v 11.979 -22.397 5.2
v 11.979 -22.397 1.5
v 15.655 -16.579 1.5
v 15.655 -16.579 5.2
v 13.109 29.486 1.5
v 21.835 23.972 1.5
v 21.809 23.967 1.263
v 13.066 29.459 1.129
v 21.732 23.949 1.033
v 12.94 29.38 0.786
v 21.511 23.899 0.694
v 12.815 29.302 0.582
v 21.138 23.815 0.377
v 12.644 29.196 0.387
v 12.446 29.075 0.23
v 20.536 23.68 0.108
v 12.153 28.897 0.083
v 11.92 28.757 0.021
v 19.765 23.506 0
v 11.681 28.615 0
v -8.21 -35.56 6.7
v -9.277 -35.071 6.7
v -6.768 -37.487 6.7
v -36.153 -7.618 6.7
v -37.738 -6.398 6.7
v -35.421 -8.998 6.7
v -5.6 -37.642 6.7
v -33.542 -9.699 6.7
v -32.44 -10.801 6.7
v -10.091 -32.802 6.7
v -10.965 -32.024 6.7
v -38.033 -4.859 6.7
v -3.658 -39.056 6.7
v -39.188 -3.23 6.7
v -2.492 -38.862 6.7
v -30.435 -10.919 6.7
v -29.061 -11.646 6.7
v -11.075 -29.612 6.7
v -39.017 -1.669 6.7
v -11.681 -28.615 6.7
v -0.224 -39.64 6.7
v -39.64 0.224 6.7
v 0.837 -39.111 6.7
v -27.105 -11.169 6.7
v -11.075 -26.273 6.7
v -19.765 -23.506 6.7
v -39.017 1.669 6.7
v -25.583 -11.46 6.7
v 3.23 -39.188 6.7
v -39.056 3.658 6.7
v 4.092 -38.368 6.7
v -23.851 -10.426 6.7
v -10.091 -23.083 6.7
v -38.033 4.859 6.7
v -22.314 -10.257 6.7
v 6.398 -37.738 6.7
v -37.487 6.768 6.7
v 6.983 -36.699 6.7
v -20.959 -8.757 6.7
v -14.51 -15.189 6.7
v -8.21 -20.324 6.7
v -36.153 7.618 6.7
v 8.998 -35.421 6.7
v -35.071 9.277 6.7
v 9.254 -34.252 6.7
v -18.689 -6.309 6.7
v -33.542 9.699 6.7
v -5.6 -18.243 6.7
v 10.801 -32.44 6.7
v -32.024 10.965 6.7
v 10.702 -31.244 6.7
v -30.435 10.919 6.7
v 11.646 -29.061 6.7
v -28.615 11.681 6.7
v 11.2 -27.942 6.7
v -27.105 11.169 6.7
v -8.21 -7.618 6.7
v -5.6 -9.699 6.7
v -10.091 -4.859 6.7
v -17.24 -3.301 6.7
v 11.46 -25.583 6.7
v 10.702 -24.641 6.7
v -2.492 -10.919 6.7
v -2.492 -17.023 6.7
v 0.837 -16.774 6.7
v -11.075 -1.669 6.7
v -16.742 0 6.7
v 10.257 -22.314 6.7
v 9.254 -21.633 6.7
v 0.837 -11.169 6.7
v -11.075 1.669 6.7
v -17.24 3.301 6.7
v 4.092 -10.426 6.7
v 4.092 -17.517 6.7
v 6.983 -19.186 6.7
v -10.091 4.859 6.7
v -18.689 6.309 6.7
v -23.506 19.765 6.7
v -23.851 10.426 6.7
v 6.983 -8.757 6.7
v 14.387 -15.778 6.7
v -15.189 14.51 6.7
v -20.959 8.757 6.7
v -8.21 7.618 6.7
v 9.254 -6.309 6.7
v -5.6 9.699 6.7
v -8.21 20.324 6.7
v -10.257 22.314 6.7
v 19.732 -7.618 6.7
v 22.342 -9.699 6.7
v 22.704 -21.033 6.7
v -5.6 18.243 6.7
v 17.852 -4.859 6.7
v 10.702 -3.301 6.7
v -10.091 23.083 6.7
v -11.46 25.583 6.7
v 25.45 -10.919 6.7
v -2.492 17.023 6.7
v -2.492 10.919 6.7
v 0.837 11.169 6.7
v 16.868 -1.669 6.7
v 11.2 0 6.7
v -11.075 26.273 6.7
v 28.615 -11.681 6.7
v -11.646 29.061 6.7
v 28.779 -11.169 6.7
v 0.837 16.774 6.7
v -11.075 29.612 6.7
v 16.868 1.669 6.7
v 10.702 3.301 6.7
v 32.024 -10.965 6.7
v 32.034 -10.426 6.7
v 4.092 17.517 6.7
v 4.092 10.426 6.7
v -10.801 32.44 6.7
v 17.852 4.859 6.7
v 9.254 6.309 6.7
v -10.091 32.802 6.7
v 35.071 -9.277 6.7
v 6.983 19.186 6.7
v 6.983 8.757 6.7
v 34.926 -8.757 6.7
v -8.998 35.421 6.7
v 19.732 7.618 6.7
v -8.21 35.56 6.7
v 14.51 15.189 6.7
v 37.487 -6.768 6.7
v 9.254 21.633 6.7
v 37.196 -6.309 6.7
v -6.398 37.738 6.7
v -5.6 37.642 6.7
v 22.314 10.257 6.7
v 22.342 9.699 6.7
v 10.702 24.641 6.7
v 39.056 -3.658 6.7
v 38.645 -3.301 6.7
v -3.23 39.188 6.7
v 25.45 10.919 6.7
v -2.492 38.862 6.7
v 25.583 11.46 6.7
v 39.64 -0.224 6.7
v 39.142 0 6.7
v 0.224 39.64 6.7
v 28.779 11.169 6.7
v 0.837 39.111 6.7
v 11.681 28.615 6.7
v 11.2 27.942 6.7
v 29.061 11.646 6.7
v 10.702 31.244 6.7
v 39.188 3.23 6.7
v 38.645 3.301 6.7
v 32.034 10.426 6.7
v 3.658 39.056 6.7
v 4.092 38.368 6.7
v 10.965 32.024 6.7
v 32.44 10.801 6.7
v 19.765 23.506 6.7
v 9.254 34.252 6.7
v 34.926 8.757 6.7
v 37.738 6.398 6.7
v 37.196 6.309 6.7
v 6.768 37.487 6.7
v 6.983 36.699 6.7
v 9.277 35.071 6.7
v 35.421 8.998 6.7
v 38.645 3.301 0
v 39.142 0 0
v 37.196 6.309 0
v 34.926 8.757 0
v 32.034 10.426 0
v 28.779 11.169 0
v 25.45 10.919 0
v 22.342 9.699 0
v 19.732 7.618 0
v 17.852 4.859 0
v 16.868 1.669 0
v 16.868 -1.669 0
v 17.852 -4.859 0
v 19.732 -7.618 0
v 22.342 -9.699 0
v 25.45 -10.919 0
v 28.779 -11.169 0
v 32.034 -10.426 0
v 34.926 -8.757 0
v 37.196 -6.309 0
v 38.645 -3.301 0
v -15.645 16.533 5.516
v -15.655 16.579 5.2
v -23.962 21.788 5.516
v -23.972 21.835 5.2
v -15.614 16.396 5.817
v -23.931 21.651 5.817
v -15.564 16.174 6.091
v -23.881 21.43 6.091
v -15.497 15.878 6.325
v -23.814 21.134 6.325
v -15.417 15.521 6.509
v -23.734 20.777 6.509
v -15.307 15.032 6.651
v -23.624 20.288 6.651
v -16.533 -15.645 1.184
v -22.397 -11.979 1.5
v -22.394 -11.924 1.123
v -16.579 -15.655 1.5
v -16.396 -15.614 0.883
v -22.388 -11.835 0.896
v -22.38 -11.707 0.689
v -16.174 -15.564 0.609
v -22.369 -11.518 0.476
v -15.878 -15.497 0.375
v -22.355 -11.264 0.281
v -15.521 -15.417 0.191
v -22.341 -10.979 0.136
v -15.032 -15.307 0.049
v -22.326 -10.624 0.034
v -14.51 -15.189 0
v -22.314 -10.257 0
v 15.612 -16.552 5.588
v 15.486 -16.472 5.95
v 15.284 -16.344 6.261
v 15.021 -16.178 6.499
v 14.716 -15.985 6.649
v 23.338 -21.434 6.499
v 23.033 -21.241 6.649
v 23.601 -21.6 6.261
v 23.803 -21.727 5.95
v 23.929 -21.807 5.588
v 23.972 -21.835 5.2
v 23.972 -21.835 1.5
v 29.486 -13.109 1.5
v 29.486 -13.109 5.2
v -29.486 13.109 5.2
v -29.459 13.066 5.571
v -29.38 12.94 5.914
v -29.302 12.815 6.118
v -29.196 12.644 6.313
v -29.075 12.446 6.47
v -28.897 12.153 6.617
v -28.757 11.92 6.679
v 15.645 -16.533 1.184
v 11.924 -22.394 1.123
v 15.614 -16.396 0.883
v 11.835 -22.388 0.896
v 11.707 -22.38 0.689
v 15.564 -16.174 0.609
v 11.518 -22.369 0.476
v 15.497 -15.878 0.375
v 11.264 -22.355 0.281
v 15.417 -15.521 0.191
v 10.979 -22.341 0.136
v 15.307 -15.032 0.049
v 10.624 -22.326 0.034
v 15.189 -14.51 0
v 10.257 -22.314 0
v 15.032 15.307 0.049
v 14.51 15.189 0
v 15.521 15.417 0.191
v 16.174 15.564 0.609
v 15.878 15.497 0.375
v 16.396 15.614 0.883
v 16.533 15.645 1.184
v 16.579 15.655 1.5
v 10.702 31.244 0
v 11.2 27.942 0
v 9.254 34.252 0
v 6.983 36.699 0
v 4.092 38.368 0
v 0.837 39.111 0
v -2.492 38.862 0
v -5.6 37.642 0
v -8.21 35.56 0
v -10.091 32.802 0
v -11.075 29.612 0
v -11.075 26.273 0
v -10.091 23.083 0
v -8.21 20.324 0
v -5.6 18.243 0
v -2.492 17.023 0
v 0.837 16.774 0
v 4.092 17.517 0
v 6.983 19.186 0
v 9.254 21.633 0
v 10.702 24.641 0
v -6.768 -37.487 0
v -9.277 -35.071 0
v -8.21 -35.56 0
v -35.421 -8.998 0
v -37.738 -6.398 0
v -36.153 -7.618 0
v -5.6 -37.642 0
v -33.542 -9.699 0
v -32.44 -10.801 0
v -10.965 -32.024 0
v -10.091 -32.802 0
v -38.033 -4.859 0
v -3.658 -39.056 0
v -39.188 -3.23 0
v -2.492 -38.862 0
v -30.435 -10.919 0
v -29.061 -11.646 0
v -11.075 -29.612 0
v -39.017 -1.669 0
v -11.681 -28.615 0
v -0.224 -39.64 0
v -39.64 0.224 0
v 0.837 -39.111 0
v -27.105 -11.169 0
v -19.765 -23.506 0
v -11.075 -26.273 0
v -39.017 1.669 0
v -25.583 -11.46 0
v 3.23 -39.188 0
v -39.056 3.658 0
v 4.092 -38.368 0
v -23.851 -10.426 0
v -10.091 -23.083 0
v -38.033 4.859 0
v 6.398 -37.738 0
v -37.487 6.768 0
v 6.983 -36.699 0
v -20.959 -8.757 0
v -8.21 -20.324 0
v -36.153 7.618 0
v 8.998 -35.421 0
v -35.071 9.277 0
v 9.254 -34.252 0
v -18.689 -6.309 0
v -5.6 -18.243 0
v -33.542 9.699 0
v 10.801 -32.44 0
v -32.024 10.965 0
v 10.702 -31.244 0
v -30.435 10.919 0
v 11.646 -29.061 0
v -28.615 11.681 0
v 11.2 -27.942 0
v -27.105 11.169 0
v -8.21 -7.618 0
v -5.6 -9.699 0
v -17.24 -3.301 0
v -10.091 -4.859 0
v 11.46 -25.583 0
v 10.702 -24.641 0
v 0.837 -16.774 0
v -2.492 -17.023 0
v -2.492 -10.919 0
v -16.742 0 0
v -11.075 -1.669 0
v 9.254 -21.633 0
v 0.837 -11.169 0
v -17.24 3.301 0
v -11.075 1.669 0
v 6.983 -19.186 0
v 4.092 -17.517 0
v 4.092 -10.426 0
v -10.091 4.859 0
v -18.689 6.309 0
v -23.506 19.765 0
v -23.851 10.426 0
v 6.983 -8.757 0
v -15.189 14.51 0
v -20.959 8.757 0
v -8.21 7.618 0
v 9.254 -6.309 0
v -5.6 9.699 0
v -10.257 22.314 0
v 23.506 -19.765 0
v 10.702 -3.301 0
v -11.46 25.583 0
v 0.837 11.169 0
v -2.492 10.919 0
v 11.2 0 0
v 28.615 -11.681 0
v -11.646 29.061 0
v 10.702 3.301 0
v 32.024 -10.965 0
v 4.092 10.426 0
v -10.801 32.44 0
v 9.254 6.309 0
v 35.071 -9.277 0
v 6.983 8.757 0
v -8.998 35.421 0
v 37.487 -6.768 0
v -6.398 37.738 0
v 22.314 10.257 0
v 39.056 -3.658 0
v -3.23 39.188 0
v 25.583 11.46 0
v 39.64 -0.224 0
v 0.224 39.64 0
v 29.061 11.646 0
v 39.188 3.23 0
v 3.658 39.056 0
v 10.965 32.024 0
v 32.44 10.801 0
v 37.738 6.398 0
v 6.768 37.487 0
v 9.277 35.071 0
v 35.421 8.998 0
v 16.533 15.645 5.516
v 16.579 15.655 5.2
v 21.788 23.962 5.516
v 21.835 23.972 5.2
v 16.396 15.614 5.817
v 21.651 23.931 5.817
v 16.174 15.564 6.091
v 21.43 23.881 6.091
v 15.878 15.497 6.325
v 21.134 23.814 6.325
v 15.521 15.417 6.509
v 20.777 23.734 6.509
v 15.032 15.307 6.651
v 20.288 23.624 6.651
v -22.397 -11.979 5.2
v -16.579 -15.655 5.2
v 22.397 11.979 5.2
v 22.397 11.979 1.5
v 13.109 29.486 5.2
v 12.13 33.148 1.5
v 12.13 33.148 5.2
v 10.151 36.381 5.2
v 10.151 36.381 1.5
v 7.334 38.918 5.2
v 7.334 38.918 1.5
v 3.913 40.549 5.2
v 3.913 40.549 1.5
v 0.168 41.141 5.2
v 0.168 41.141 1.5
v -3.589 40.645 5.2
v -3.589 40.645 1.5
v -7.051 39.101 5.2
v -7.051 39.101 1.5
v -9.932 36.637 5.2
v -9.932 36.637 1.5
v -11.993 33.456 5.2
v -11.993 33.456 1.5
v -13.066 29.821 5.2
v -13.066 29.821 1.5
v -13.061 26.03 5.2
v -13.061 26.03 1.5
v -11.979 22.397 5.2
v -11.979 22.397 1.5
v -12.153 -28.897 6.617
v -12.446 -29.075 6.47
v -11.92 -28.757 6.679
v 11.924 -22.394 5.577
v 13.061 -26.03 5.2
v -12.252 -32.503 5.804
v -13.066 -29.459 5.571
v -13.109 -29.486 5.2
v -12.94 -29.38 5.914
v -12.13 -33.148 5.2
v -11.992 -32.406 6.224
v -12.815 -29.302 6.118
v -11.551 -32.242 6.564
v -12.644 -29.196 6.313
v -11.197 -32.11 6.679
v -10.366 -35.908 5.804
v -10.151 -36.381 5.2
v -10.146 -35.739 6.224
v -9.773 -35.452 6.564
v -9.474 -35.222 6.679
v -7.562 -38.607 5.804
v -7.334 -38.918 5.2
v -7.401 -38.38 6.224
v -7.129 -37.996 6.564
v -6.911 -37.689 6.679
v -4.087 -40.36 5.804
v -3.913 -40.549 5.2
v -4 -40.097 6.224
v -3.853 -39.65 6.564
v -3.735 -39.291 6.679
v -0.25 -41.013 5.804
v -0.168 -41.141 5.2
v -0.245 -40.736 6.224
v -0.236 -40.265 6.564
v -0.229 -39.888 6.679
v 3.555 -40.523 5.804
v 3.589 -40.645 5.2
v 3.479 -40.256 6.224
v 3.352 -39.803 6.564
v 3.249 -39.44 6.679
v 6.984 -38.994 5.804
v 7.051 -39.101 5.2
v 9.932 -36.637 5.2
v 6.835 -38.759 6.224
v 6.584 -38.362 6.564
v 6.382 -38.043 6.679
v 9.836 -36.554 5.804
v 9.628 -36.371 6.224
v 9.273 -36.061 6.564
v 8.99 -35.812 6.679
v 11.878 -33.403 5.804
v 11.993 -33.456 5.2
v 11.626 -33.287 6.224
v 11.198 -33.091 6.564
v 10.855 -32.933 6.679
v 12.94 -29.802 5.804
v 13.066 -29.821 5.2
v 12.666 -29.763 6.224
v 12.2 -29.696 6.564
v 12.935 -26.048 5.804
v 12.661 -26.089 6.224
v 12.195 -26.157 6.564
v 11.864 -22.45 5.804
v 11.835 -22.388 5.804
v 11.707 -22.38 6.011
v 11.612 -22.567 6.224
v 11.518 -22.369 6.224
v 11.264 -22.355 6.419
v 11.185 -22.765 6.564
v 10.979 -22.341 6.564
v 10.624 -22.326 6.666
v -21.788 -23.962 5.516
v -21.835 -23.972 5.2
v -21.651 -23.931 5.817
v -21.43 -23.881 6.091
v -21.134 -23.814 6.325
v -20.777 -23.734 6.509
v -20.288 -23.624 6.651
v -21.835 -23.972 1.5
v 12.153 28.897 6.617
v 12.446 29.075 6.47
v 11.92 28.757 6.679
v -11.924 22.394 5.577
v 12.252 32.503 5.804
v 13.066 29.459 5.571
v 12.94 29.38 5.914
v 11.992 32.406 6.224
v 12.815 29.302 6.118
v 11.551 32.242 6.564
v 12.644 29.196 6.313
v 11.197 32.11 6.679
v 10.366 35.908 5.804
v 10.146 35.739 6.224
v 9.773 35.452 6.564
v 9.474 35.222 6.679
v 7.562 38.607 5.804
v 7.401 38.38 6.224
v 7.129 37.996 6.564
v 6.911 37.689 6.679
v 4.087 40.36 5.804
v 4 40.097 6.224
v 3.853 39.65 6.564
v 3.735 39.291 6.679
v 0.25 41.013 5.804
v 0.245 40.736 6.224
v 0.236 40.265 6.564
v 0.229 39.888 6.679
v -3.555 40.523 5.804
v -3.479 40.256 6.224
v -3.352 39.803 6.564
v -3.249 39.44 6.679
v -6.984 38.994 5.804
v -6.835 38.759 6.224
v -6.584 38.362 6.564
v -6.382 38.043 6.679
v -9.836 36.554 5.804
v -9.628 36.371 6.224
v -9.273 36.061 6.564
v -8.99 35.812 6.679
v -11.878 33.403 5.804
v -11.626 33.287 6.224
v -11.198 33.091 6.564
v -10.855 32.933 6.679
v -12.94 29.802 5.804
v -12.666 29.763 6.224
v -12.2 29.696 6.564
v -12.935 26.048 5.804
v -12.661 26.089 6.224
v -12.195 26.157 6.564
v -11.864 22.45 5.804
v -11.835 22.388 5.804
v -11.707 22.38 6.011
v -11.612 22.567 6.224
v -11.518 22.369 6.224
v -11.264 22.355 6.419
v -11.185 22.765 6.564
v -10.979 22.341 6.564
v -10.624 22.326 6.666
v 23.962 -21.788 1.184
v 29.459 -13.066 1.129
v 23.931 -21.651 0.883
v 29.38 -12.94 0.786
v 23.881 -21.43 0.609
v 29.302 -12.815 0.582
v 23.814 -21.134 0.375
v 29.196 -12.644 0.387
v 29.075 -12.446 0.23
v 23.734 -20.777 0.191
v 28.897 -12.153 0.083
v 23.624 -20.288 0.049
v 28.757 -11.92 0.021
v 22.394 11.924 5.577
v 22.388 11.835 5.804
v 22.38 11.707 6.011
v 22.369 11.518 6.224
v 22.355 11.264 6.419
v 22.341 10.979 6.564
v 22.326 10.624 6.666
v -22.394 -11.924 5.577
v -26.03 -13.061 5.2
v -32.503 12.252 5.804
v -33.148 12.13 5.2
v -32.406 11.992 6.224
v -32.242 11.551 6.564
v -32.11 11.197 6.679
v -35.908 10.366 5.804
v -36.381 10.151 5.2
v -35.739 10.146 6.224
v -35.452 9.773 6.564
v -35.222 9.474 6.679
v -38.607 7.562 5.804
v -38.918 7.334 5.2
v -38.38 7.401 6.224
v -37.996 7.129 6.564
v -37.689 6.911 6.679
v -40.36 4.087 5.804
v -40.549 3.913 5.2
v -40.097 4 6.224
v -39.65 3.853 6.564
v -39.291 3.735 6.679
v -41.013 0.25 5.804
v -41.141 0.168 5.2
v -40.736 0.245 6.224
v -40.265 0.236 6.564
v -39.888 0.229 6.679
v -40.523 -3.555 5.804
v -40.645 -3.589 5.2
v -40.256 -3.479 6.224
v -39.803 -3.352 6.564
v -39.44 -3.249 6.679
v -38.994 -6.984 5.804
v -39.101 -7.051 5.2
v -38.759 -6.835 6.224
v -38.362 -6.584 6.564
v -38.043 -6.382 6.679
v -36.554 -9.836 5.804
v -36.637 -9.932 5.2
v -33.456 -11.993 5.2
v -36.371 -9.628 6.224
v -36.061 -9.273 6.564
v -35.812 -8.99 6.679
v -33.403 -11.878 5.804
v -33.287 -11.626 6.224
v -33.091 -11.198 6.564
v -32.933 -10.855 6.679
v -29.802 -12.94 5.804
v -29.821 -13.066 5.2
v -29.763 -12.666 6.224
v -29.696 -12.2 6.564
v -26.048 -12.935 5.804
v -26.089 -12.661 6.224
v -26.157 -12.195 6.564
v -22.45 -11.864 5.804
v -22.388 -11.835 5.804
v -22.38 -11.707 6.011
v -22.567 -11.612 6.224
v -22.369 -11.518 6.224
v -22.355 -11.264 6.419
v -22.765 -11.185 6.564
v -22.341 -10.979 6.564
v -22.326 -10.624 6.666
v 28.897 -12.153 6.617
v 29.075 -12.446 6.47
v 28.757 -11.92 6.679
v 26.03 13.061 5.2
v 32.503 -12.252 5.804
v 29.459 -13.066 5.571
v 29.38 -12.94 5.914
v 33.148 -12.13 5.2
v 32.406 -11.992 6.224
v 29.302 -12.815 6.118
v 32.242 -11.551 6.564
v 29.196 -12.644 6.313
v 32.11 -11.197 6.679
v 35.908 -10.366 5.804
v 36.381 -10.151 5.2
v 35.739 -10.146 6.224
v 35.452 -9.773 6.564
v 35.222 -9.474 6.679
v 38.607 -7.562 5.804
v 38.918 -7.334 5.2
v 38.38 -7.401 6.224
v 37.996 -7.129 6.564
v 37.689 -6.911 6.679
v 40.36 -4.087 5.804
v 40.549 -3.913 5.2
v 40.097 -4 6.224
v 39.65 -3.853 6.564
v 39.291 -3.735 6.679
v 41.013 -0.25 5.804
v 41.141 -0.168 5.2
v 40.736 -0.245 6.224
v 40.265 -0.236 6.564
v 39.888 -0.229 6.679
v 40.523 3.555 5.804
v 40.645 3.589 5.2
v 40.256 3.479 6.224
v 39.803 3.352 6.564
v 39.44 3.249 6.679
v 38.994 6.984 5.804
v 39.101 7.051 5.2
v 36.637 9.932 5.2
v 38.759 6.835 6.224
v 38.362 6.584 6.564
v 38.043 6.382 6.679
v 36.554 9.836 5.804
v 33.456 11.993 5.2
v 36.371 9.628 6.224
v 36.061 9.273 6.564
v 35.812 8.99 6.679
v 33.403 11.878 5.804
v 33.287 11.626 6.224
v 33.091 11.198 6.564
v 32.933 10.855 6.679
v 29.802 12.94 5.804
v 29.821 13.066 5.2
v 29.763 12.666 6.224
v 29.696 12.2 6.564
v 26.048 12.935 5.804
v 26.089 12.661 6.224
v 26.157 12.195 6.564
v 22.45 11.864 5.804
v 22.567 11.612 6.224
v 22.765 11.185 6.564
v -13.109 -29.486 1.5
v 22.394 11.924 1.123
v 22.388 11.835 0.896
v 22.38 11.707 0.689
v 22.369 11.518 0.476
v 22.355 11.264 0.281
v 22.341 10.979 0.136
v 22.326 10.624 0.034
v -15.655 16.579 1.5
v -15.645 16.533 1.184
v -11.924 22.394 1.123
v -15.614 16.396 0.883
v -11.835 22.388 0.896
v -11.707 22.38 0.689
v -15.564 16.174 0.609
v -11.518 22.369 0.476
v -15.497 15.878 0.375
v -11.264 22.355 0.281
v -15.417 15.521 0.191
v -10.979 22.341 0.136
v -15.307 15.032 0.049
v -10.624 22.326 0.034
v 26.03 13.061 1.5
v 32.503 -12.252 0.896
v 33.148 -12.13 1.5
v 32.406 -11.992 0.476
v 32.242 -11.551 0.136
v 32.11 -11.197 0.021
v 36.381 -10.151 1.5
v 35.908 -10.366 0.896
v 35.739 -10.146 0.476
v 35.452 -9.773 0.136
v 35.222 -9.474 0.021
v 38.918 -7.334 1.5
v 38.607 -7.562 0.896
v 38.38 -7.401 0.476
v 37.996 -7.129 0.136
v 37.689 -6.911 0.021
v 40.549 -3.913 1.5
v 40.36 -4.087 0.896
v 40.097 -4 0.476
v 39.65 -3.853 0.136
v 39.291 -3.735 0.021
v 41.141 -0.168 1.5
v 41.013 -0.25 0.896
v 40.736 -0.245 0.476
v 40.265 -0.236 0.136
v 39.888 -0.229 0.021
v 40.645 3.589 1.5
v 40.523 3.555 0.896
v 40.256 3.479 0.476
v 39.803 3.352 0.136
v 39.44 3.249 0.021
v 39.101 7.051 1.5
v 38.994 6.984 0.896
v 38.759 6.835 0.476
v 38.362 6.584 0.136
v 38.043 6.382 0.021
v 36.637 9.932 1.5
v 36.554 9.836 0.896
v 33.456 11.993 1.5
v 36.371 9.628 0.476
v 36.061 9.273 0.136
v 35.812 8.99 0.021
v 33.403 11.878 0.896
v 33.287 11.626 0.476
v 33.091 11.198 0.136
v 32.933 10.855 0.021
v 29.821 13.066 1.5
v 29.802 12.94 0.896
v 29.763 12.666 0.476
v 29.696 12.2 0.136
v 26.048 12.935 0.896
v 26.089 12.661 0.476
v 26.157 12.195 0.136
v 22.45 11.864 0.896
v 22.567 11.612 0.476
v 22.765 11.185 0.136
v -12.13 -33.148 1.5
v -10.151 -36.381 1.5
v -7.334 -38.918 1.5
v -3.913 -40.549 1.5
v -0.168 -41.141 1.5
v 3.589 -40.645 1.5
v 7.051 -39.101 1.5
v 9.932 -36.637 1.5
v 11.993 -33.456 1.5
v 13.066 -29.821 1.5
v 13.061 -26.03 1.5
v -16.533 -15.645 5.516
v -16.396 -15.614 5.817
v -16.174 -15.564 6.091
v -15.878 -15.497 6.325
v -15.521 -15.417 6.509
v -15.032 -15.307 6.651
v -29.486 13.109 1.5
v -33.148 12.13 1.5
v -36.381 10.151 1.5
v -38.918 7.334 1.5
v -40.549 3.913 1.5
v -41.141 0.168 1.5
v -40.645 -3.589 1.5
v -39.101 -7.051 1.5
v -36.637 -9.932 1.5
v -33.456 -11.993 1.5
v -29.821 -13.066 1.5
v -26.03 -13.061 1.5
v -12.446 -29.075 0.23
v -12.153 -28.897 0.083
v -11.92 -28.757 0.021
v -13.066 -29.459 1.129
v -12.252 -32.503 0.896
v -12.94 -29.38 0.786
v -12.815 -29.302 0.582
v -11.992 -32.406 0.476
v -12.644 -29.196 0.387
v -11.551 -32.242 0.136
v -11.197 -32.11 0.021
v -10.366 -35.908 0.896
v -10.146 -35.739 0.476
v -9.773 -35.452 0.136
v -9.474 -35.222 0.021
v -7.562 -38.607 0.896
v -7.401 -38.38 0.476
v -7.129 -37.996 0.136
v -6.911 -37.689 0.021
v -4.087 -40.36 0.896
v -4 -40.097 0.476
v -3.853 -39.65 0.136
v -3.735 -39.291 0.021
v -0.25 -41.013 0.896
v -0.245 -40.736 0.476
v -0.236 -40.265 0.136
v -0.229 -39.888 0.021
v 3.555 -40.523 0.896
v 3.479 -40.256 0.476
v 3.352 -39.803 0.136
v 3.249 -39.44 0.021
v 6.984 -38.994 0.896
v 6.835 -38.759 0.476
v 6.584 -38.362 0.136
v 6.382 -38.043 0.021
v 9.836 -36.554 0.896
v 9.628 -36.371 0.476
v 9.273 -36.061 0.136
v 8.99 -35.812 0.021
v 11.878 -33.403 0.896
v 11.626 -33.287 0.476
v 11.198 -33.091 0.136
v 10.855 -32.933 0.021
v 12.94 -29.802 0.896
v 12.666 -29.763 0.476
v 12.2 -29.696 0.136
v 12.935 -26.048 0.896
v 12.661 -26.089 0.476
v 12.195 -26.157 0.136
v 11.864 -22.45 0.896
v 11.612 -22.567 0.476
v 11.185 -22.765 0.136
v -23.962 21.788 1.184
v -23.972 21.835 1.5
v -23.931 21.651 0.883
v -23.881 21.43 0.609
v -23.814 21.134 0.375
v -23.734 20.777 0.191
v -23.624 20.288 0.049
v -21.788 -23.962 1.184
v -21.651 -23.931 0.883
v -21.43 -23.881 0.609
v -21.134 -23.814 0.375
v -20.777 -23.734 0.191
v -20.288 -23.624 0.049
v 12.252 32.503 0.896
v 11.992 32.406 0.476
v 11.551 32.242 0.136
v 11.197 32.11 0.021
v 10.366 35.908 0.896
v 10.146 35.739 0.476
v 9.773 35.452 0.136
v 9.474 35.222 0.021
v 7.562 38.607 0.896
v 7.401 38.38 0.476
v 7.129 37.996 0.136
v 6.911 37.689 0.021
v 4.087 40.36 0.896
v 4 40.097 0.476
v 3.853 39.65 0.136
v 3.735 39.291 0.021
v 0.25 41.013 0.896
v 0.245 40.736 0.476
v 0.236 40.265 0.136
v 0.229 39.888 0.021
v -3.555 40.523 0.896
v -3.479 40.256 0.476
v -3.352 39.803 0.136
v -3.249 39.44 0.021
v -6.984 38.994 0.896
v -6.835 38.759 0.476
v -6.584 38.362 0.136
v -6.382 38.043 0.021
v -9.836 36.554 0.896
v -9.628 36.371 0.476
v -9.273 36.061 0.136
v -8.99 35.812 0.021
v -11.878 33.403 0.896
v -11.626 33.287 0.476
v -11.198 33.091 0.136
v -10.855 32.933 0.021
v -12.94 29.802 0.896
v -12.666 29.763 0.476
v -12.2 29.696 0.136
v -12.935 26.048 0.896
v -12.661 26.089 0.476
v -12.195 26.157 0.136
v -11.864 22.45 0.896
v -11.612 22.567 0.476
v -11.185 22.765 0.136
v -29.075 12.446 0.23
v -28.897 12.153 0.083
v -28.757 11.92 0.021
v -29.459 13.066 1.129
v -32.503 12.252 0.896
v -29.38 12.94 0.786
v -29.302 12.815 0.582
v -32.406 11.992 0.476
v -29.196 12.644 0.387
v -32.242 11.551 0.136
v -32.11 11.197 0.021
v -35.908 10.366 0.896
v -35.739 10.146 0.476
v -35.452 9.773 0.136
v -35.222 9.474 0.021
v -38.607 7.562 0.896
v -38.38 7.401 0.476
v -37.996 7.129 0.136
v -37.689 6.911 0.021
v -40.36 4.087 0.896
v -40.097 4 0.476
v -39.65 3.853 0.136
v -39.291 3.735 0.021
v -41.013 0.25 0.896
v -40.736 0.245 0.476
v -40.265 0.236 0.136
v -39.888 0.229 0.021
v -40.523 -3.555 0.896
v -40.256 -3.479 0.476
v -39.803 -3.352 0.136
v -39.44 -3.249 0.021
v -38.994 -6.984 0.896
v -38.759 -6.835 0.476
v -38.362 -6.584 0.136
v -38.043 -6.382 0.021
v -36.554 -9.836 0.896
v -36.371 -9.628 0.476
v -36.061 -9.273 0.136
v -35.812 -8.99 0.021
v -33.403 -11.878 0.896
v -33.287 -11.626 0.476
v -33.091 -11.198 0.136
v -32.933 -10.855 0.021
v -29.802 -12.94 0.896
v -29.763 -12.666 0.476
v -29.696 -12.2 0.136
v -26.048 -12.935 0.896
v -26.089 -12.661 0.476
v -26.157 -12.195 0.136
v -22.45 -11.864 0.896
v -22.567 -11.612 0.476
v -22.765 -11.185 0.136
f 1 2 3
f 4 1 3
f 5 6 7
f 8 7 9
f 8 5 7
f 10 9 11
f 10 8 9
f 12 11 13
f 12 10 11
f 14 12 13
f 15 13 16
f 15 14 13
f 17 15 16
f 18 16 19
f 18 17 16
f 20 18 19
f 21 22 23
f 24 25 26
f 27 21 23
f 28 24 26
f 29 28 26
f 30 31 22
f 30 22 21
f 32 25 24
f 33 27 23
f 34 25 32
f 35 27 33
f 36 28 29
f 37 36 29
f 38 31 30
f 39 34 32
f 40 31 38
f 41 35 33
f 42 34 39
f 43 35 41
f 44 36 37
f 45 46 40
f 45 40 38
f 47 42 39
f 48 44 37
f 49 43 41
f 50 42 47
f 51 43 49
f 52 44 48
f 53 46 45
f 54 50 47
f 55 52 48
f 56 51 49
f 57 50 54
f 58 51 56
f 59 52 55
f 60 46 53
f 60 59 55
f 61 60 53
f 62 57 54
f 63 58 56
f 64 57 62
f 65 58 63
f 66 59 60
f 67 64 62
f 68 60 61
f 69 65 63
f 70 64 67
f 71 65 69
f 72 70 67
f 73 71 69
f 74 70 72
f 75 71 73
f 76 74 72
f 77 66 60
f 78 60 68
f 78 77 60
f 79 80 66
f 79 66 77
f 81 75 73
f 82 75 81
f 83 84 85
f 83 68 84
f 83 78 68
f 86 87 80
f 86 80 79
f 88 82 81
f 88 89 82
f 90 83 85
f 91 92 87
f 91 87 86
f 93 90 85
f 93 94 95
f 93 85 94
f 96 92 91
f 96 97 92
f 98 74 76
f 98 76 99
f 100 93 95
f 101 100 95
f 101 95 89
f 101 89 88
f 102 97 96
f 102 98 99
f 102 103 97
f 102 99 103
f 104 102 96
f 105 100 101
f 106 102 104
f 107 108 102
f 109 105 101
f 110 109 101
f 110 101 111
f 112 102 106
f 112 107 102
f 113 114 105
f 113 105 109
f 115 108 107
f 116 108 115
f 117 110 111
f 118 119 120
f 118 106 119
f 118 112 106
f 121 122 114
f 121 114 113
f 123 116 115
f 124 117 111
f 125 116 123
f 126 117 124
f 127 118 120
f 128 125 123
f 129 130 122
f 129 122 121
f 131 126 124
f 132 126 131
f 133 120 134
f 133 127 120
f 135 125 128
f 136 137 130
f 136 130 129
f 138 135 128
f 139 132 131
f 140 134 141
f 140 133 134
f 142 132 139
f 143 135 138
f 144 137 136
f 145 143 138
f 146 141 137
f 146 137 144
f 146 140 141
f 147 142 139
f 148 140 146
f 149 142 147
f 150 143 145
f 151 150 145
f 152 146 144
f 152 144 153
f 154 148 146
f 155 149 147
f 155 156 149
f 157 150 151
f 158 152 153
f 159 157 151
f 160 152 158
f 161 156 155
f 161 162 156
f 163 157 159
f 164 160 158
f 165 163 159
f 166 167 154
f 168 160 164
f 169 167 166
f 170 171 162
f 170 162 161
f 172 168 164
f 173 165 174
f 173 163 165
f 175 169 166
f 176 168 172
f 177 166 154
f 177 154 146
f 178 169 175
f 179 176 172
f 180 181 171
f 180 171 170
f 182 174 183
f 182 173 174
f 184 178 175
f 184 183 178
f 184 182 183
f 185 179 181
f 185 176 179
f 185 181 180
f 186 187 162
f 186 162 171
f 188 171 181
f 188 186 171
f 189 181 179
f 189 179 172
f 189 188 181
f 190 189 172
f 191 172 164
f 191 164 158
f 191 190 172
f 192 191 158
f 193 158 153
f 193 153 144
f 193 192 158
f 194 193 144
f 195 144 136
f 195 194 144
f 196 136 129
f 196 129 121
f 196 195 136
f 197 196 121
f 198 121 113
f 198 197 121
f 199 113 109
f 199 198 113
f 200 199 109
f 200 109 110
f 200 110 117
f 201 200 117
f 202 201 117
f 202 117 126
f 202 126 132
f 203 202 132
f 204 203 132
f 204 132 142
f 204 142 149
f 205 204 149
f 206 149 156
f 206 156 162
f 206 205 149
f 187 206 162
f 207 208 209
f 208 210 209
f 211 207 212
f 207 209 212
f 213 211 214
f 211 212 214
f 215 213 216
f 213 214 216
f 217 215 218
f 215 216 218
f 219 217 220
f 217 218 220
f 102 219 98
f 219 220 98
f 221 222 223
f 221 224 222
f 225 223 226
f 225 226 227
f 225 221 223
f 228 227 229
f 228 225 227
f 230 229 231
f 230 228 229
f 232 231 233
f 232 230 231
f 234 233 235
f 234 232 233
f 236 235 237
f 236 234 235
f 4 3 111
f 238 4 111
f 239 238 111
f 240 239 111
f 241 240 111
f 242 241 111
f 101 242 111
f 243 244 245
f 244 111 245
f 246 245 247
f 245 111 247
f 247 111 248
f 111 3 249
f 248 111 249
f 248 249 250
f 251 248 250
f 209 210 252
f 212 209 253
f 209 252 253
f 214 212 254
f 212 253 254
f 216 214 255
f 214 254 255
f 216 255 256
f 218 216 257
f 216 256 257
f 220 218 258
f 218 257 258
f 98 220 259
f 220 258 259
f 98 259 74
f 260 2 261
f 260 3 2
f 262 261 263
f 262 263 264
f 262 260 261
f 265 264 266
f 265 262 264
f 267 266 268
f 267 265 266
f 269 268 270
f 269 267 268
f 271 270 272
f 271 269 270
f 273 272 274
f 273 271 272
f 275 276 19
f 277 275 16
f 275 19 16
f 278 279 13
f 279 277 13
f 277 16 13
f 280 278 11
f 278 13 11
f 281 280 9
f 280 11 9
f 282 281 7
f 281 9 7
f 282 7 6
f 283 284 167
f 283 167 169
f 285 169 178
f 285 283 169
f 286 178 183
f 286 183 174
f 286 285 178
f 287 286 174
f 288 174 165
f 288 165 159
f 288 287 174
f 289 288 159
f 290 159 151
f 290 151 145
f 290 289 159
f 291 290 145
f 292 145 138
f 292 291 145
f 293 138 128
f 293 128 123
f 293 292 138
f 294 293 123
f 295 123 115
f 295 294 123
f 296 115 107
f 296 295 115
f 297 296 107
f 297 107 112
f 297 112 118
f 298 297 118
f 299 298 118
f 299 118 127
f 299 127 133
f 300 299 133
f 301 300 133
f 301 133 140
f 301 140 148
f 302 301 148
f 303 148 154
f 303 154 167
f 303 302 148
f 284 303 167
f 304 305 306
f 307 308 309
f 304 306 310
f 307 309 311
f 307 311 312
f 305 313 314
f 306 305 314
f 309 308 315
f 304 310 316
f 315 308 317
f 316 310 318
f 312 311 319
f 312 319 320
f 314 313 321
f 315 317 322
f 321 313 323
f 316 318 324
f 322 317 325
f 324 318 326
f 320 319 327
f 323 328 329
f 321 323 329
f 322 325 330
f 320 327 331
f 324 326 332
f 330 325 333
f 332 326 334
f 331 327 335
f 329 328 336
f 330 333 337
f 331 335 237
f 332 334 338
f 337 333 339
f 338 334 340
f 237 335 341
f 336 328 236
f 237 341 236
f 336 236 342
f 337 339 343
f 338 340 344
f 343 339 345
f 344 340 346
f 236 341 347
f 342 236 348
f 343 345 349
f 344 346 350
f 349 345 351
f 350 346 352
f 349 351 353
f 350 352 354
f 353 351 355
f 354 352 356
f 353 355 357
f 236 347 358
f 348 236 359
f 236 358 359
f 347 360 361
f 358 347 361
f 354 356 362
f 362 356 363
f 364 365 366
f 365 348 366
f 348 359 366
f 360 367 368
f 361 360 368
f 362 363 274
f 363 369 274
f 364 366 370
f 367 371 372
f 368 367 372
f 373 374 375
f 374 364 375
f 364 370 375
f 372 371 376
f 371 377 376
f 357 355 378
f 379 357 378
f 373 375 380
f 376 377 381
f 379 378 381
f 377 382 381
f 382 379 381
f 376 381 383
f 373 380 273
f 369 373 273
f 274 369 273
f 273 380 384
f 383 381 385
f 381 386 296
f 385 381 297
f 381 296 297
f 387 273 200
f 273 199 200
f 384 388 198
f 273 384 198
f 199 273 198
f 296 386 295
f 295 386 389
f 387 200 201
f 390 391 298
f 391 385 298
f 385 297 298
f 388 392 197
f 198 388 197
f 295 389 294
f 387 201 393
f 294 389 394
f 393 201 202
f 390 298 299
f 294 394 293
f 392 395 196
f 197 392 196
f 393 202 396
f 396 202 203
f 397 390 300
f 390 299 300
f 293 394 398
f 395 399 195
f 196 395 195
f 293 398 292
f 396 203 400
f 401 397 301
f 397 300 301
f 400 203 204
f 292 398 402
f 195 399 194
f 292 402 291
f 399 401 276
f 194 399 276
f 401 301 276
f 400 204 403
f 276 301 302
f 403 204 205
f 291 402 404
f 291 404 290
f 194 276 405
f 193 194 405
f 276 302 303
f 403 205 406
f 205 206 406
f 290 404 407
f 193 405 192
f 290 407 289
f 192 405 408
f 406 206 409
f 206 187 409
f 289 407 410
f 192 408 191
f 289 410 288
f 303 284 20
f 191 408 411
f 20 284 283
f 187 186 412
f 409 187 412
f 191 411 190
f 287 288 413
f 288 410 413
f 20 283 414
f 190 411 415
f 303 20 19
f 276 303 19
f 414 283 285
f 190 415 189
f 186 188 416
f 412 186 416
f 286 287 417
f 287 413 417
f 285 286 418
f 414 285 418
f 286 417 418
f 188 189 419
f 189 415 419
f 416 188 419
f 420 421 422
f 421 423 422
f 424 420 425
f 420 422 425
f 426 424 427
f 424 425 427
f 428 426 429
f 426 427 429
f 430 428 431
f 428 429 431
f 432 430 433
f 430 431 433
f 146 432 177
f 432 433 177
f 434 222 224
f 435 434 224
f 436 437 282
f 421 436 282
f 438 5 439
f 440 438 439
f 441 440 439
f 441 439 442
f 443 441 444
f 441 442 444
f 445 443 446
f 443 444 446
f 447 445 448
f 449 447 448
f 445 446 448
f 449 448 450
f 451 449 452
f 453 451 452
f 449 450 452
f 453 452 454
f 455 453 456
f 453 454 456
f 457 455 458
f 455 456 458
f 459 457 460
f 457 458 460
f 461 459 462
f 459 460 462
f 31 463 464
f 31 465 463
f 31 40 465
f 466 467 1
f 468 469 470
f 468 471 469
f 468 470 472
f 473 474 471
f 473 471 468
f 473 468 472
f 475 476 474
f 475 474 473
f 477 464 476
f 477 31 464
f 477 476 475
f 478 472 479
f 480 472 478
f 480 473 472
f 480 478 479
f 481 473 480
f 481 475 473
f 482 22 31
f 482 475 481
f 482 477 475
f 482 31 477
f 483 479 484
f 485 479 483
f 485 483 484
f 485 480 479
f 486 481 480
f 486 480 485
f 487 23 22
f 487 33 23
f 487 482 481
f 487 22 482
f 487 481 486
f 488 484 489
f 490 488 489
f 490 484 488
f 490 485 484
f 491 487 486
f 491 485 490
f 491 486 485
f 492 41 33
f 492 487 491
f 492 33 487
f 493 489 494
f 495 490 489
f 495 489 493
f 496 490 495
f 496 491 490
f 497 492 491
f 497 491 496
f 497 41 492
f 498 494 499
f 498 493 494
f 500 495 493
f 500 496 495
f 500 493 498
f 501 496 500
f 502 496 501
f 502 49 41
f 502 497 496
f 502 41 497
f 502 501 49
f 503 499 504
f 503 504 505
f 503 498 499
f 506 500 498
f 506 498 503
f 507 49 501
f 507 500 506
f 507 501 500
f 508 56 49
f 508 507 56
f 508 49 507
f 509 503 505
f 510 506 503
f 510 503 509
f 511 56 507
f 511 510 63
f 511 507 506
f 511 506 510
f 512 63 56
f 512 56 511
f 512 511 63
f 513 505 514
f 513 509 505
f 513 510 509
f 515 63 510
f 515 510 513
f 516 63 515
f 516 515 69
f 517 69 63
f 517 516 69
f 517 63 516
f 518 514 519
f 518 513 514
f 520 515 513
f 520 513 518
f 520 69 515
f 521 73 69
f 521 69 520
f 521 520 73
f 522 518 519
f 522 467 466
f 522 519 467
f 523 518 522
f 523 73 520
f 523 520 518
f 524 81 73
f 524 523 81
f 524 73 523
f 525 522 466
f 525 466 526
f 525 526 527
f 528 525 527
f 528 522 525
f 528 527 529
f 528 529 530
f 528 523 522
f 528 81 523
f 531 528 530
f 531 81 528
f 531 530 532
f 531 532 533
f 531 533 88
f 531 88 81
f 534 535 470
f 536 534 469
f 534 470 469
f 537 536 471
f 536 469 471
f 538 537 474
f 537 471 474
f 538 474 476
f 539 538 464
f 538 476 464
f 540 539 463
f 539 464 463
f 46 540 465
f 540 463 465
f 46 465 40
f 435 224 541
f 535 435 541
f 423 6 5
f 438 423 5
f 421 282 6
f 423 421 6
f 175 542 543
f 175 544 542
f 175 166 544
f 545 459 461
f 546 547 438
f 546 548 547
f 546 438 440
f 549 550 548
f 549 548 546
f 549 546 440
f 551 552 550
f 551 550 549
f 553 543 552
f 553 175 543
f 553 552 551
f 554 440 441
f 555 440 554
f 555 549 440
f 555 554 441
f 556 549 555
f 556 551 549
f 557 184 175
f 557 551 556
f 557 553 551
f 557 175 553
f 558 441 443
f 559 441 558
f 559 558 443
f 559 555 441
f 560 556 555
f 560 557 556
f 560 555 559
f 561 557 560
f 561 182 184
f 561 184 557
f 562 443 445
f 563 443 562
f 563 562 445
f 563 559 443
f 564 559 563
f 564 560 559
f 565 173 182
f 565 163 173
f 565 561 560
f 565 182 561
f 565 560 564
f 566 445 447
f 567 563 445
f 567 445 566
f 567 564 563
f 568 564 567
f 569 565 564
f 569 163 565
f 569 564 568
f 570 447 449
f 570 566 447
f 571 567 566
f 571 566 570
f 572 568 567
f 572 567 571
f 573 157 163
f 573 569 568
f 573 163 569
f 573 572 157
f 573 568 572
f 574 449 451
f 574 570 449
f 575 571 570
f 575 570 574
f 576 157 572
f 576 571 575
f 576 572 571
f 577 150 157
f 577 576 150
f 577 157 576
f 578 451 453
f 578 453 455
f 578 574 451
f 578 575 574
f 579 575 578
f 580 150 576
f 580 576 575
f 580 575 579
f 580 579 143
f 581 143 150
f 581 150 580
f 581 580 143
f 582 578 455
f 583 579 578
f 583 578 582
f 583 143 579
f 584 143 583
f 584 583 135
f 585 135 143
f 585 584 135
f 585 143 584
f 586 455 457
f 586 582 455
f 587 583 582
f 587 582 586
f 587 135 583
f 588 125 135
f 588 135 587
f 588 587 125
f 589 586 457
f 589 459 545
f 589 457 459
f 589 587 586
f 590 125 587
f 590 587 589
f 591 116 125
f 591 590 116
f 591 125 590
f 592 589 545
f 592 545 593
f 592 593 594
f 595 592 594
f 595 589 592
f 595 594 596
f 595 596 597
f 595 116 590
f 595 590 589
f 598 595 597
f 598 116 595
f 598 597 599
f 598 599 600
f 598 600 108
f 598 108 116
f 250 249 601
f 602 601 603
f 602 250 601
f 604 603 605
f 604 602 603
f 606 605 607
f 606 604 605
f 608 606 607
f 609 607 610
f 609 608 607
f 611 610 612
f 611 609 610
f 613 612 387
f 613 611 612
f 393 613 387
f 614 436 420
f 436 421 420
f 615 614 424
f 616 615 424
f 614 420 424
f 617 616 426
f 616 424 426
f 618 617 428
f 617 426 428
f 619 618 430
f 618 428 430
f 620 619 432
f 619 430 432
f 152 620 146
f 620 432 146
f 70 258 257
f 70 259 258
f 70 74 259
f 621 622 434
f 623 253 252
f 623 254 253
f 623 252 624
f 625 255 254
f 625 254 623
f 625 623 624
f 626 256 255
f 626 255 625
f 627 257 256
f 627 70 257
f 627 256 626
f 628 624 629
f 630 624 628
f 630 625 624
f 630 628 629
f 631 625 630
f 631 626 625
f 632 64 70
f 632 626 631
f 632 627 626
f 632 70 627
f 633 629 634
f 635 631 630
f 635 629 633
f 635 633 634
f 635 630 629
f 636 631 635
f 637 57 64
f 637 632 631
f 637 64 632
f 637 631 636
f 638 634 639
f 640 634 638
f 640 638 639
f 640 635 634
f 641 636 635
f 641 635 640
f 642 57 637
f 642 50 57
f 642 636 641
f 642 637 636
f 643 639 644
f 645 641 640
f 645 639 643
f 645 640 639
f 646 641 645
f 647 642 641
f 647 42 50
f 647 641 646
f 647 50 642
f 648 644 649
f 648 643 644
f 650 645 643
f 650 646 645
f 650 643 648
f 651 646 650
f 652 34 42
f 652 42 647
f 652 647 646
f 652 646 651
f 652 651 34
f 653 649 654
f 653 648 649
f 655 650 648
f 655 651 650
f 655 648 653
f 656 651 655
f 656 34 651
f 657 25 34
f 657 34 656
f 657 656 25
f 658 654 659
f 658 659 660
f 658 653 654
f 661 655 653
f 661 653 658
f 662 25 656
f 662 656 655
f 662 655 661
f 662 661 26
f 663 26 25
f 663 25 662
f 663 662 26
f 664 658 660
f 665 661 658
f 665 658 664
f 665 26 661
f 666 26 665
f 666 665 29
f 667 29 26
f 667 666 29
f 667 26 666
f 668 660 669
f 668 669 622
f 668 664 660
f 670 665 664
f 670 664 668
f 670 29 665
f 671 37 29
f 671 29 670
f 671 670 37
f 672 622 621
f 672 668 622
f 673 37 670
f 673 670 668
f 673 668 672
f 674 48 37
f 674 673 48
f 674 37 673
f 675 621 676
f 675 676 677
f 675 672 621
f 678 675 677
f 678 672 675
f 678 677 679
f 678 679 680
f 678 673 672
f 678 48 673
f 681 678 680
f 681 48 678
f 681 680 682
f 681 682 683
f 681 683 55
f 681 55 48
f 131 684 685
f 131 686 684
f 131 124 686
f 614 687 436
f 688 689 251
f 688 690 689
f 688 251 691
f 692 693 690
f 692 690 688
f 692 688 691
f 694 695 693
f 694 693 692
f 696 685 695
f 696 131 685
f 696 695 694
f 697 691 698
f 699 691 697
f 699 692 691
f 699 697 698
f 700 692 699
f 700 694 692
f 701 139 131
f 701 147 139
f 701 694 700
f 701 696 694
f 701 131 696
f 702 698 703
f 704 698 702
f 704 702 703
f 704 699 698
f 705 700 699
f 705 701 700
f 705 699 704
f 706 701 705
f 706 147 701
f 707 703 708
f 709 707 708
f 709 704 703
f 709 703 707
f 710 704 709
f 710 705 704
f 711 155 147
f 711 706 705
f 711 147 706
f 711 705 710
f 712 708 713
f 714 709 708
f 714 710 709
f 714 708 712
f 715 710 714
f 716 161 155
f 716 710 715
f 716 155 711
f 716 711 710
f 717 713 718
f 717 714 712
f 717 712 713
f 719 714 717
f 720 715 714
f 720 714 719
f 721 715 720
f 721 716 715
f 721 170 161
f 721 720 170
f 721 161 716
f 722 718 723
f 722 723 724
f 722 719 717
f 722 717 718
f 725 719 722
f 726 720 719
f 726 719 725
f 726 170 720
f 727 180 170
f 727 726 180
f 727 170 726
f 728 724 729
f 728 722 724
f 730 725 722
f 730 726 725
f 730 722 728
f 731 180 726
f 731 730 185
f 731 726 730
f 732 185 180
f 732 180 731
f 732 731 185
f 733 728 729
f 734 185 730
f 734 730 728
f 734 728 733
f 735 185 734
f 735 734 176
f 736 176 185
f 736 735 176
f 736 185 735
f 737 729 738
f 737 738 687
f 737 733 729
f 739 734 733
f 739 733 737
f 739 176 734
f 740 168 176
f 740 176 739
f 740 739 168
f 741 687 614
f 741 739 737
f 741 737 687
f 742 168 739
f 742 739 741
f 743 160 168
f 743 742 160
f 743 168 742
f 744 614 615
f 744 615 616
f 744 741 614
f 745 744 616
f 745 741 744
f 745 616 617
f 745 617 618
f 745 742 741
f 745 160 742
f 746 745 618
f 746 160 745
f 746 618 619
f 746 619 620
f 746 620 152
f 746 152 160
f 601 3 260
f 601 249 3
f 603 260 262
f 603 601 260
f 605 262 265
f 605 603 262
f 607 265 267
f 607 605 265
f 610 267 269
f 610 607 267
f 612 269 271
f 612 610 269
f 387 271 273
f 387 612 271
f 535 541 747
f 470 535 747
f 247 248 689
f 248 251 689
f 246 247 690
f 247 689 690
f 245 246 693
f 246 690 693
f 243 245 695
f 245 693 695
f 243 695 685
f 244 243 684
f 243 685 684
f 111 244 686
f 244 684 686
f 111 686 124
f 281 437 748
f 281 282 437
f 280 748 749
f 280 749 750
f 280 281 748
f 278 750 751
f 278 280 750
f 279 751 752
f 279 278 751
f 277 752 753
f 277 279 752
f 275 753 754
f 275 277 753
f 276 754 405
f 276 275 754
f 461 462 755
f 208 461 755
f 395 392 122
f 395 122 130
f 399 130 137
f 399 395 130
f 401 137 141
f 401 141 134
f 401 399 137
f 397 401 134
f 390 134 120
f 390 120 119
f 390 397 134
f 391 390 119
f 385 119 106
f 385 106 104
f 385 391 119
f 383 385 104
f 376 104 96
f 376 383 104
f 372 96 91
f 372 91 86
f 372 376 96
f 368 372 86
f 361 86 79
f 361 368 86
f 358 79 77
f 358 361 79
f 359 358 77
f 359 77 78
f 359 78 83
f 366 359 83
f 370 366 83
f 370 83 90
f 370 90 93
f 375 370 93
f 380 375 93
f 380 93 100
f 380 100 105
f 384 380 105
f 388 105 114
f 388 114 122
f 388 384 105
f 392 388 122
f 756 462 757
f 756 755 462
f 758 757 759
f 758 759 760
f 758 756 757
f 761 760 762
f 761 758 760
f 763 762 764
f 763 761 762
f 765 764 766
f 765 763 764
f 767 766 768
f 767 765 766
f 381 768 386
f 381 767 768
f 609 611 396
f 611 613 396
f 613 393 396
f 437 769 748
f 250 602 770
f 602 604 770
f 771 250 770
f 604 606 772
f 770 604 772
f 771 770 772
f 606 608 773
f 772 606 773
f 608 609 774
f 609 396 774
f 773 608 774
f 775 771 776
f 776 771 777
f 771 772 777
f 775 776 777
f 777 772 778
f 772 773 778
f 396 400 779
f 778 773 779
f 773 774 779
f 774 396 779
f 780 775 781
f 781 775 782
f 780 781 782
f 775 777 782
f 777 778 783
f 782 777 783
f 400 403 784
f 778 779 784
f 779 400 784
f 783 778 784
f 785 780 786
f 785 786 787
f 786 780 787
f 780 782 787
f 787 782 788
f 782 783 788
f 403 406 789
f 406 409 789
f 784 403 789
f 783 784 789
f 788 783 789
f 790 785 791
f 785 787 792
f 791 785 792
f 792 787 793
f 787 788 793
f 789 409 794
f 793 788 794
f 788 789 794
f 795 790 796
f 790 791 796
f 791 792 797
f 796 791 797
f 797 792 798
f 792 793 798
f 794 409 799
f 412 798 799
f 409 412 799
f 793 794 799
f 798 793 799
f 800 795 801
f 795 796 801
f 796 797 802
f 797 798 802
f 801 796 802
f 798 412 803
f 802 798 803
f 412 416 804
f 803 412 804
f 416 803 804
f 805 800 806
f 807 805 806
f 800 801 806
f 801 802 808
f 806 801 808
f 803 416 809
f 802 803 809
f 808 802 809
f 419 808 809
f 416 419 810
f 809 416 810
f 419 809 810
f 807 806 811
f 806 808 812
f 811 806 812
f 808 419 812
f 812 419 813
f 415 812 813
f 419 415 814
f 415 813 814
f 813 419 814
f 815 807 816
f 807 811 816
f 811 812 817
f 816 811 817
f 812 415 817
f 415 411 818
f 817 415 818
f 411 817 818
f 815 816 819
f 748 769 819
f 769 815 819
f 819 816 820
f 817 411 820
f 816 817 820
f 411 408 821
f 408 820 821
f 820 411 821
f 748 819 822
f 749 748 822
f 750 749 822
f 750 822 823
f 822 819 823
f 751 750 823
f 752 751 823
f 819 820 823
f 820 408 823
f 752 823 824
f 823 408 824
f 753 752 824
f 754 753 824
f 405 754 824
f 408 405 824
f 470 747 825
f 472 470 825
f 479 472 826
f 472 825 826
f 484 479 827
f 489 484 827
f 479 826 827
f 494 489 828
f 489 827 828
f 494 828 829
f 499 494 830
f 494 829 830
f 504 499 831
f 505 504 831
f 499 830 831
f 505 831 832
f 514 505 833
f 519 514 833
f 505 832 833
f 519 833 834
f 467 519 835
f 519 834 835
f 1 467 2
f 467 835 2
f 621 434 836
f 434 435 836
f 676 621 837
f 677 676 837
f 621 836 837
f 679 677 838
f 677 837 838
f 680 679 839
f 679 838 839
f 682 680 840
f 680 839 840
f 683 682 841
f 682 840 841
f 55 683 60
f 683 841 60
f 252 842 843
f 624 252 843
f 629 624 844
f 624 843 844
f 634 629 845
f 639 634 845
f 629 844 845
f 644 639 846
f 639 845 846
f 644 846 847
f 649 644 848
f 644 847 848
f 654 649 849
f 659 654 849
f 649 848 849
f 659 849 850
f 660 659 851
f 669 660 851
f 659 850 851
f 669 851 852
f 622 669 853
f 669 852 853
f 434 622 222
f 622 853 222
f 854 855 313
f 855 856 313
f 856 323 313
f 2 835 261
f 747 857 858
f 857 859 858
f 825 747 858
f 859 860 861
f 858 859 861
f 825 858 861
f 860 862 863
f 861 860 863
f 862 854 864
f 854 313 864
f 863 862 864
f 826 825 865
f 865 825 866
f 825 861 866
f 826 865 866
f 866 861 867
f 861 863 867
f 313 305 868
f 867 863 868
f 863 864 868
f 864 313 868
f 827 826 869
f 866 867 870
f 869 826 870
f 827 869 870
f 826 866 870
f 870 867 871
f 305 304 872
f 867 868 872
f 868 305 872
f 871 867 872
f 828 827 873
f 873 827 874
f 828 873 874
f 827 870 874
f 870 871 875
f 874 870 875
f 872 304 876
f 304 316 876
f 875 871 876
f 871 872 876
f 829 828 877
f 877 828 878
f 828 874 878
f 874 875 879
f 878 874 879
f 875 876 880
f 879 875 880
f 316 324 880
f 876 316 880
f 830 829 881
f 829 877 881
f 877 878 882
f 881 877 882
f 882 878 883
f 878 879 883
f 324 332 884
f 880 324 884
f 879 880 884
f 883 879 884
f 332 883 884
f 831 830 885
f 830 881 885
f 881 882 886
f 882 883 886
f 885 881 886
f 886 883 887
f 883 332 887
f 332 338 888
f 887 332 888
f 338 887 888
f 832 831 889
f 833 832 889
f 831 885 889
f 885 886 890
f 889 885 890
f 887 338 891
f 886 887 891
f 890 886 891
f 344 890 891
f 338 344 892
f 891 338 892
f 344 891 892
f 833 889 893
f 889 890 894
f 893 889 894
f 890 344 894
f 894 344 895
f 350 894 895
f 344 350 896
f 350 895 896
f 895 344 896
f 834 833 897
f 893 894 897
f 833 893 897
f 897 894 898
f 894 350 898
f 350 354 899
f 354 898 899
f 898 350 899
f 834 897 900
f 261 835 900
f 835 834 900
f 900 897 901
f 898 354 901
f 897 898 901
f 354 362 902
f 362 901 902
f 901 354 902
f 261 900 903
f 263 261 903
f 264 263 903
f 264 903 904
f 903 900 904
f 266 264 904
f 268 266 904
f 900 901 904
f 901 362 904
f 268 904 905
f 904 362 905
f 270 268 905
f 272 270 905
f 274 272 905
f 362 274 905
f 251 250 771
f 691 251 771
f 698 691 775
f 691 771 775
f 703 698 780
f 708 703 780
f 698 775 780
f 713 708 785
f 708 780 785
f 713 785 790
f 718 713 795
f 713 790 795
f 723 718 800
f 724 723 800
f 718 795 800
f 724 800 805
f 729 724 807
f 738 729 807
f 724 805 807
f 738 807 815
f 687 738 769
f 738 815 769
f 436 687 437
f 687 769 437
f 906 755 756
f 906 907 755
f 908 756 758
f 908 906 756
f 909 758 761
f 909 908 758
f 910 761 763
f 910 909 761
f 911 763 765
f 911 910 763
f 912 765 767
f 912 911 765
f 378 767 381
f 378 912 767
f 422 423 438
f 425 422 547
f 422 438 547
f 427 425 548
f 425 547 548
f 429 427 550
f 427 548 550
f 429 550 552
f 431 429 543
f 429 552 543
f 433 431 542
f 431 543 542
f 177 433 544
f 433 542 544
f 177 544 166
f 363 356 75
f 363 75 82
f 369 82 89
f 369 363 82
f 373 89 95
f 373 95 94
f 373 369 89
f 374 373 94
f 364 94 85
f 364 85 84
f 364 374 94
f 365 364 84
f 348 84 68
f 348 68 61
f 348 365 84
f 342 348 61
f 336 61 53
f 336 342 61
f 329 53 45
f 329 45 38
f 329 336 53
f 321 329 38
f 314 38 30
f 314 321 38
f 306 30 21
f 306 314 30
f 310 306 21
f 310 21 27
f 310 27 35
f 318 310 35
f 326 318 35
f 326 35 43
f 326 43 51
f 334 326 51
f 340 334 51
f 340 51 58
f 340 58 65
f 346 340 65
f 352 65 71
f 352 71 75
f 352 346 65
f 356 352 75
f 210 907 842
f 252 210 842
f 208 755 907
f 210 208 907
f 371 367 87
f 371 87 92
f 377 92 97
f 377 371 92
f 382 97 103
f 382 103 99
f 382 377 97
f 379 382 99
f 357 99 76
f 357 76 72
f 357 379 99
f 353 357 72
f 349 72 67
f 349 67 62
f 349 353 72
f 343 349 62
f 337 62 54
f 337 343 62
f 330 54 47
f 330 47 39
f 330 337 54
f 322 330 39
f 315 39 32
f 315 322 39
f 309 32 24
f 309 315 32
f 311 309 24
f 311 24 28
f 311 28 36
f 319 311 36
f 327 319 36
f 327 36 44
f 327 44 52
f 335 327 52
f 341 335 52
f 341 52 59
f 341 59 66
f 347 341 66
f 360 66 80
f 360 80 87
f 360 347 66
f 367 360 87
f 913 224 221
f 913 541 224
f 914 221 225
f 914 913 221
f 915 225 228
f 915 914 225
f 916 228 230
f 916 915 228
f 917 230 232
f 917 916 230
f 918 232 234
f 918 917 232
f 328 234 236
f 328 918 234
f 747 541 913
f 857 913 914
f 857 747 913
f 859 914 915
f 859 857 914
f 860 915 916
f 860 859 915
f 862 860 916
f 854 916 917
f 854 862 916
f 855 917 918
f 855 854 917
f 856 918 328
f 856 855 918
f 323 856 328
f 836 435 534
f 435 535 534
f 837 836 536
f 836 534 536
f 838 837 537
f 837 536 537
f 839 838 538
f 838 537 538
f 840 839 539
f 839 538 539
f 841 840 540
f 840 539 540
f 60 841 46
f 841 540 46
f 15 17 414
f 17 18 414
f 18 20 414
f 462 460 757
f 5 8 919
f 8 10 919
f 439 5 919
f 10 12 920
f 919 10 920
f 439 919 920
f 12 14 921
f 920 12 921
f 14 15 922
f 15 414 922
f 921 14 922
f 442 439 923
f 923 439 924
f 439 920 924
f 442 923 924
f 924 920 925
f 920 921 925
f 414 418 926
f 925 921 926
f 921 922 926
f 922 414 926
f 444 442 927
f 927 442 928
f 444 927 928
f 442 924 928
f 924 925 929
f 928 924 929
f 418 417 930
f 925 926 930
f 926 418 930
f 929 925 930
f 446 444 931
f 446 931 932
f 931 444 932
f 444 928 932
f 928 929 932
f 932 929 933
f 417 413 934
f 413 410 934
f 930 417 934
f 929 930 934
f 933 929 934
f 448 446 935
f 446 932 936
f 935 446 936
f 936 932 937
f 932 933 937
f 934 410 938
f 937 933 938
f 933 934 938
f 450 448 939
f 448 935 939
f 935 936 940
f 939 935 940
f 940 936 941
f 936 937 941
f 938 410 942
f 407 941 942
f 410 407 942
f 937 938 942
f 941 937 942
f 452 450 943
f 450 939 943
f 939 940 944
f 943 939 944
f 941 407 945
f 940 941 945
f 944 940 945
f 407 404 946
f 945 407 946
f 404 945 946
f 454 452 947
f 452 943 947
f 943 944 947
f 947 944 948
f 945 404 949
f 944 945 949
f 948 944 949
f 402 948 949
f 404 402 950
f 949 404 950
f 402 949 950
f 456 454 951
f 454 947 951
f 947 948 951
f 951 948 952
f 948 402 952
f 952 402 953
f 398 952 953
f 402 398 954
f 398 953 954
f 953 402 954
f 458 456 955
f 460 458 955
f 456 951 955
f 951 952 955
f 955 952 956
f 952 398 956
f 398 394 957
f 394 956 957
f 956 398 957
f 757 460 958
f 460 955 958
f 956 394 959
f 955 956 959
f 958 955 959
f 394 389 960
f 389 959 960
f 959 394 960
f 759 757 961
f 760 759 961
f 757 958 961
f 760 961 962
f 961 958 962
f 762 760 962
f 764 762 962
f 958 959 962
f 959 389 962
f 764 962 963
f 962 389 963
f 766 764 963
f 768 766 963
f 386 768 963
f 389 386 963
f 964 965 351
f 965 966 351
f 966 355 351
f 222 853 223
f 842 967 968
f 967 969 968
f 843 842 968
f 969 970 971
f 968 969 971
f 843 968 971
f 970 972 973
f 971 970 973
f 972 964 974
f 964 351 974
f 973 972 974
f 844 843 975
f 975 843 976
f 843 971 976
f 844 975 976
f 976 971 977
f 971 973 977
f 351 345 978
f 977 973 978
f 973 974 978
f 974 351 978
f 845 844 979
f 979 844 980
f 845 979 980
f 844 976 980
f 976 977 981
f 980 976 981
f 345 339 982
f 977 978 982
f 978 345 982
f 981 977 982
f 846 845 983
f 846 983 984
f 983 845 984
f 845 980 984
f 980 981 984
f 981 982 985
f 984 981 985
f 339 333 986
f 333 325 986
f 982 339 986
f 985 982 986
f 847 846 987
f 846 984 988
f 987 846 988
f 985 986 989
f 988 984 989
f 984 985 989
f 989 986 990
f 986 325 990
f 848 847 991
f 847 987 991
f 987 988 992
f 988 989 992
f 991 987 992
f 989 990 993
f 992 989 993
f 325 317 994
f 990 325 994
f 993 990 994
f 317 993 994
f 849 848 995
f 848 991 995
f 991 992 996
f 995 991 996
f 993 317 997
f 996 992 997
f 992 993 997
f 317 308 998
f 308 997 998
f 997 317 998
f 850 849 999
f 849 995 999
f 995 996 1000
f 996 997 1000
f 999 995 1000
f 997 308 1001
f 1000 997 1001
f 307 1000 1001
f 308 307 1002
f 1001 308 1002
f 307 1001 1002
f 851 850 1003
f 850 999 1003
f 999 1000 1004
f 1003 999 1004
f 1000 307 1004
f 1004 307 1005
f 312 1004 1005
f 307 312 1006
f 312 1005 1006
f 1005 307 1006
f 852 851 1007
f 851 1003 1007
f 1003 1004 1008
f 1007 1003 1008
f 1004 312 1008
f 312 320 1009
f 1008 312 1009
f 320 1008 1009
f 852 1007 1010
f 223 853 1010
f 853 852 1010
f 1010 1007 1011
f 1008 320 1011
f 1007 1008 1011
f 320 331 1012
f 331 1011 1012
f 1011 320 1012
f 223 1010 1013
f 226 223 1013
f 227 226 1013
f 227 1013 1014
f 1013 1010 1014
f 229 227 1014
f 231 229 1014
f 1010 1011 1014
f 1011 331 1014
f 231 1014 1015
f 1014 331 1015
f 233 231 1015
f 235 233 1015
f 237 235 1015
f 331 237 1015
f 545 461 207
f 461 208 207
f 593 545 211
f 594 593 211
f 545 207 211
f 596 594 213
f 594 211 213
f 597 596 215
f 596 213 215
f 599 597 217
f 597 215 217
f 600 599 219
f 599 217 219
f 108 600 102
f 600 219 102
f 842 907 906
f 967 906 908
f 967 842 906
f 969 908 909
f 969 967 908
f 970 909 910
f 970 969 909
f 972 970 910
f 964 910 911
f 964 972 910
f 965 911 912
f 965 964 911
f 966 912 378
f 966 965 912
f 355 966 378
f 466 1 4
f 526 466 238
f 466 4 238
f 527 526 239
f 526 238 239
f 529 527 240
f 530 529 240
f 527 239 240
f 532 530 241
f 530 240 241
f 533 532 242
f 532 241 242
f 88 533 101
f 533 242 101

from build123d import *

# Parameters (mm, degrees)
F0_R     = 11.2
F1_DEPTH = 6.7
F2_R     = 1.5
F3_R     = 1.5


with BuildPart() as f1:
    # F0 (on Top) → F1 (new body)
    with BuildSketch(Plane.XY):
        with BuildLine():
            Line((21.834791, 23.972463), (13.109393, 29.486381))
            ThreePointArc((13.109393, 29.486381), (-3.58944, 40.645018), (-11.978707, 22.397103))
            Line((-11.978707, 22.397103), (-15.655433, 16.578936))
            Line((-15.655433, 16.578936), (-23.972463, 21.834791))
            Line((-23.972463, 21.834791), (-29.486381, 13.109393))
            ThreePointArc((-29.486381, 13.109393), (-40.645018, -3.58944), (-22.397103, -11.978707))
            Line((-22.397103, -11.978707), (-16.578936, -15.655433))
            Line((-16.578936, -15.655433), (-21.834791, -23.972463))
            Line((-21.834791, -23.972463), (-13.109393, -29.486381))
            ThreePointArc((-13.109393, -29.486381), (3.58944, -40.645018), (11.978707, -22.397103))
            Line((11.978707, -22.397103), (15.655433, -16.578936))
            Line((15.655433, -16.578936), (23.972463, -21.834791))
            Line((23.972463, -21.834791), (29.486381, -13.109393))
            ThreePointArc((29.486381, -13.109393), (40.645018, 3.58944), (22.397103, 11.978707))
            Line((22.397103, 11.978707), (16.578936, 15.655433))
            Line((16.578936, 15.655433), (21.834791, 23.972463))
        make_face()
        with Locations((0, -27.942423)):
            Circle(F0_R, mode=Mode.SUBTRACT)
        with Locations((-27.942423, 0)):
            Circle(F0_R, mode=Mode.SUBTRACT)
        Circle(F0_R, mode=Mode.SUBTRACT)
        with Locations((27.942423, 0)):
            Circle(F0_R, mode=Mode.SUBTRACT)
        with Locations((0, 27.942423)):
            Circle(F0_R, mode=Mode.SUBTRACT)
    extrude(amount=F1_DEPTH)

    # F2
    f2_edges = [f1.edges().sort_by_distance(p)[0] for p in [
        (17.472092, 26.729422, 6.7),
        (-3.58944, 40.645018, 6.7),
        (19.488019, 13.81707, 6.7),
        (19.206863, 19.813948, 6.7),
        (40.645018, 3.58944, 6.7),
        (26.729422, -17.472092, 6.7),
        (13.81707, -19.488019, 6.7),
        (3.58944, -40.645018, 6.7),
        (-17.472092, -26.729422, 6.7),
        (-19.488019, -13.81707, 6.7),
        (-19.206863, -19.813948, 6.7),
        (-40.645018, -3.58944, 6.7),
        (-26.729422, 17.472092, 6.7),
        (-13.81707, 19.488019, 6.7),
        (-19.813948, 19.206863, 6.7),
    ]]
    fillet(f2_edges, radius=F2_R)

    # F3
    f3_edges = [f1.edges().sort_by_distance(p)[0] for p in [
        (3.58944, -40.645018, 0),
        (13.81707, -19.488019, 0),
        (19.813948, -19.206863, 0),
        (40.645018, 3.58944, 0),
        (26.729422, -17.472092, 0),
        (19.488019, 13.81707, 0),
        (19.206863, 19.813948, 0),
        (17.472092, 26.729422, 0),
        (-3.58944, 40.645018, 0),
        (-13.81707, 19.488019, 0),
        (-19.813948, 19.206863, 0),
        (-26.729422, 17.472092, 0),
        (-40.645018, -3.58944, 0),
        (-19.488019, -13.81707, 0),
        (-19.206863, -19.813948, 0),
        (-17.472092, -26.729422, 0),
    ]]
    fillet(f3_edges, radius=F3_R)


solid = f1.part
